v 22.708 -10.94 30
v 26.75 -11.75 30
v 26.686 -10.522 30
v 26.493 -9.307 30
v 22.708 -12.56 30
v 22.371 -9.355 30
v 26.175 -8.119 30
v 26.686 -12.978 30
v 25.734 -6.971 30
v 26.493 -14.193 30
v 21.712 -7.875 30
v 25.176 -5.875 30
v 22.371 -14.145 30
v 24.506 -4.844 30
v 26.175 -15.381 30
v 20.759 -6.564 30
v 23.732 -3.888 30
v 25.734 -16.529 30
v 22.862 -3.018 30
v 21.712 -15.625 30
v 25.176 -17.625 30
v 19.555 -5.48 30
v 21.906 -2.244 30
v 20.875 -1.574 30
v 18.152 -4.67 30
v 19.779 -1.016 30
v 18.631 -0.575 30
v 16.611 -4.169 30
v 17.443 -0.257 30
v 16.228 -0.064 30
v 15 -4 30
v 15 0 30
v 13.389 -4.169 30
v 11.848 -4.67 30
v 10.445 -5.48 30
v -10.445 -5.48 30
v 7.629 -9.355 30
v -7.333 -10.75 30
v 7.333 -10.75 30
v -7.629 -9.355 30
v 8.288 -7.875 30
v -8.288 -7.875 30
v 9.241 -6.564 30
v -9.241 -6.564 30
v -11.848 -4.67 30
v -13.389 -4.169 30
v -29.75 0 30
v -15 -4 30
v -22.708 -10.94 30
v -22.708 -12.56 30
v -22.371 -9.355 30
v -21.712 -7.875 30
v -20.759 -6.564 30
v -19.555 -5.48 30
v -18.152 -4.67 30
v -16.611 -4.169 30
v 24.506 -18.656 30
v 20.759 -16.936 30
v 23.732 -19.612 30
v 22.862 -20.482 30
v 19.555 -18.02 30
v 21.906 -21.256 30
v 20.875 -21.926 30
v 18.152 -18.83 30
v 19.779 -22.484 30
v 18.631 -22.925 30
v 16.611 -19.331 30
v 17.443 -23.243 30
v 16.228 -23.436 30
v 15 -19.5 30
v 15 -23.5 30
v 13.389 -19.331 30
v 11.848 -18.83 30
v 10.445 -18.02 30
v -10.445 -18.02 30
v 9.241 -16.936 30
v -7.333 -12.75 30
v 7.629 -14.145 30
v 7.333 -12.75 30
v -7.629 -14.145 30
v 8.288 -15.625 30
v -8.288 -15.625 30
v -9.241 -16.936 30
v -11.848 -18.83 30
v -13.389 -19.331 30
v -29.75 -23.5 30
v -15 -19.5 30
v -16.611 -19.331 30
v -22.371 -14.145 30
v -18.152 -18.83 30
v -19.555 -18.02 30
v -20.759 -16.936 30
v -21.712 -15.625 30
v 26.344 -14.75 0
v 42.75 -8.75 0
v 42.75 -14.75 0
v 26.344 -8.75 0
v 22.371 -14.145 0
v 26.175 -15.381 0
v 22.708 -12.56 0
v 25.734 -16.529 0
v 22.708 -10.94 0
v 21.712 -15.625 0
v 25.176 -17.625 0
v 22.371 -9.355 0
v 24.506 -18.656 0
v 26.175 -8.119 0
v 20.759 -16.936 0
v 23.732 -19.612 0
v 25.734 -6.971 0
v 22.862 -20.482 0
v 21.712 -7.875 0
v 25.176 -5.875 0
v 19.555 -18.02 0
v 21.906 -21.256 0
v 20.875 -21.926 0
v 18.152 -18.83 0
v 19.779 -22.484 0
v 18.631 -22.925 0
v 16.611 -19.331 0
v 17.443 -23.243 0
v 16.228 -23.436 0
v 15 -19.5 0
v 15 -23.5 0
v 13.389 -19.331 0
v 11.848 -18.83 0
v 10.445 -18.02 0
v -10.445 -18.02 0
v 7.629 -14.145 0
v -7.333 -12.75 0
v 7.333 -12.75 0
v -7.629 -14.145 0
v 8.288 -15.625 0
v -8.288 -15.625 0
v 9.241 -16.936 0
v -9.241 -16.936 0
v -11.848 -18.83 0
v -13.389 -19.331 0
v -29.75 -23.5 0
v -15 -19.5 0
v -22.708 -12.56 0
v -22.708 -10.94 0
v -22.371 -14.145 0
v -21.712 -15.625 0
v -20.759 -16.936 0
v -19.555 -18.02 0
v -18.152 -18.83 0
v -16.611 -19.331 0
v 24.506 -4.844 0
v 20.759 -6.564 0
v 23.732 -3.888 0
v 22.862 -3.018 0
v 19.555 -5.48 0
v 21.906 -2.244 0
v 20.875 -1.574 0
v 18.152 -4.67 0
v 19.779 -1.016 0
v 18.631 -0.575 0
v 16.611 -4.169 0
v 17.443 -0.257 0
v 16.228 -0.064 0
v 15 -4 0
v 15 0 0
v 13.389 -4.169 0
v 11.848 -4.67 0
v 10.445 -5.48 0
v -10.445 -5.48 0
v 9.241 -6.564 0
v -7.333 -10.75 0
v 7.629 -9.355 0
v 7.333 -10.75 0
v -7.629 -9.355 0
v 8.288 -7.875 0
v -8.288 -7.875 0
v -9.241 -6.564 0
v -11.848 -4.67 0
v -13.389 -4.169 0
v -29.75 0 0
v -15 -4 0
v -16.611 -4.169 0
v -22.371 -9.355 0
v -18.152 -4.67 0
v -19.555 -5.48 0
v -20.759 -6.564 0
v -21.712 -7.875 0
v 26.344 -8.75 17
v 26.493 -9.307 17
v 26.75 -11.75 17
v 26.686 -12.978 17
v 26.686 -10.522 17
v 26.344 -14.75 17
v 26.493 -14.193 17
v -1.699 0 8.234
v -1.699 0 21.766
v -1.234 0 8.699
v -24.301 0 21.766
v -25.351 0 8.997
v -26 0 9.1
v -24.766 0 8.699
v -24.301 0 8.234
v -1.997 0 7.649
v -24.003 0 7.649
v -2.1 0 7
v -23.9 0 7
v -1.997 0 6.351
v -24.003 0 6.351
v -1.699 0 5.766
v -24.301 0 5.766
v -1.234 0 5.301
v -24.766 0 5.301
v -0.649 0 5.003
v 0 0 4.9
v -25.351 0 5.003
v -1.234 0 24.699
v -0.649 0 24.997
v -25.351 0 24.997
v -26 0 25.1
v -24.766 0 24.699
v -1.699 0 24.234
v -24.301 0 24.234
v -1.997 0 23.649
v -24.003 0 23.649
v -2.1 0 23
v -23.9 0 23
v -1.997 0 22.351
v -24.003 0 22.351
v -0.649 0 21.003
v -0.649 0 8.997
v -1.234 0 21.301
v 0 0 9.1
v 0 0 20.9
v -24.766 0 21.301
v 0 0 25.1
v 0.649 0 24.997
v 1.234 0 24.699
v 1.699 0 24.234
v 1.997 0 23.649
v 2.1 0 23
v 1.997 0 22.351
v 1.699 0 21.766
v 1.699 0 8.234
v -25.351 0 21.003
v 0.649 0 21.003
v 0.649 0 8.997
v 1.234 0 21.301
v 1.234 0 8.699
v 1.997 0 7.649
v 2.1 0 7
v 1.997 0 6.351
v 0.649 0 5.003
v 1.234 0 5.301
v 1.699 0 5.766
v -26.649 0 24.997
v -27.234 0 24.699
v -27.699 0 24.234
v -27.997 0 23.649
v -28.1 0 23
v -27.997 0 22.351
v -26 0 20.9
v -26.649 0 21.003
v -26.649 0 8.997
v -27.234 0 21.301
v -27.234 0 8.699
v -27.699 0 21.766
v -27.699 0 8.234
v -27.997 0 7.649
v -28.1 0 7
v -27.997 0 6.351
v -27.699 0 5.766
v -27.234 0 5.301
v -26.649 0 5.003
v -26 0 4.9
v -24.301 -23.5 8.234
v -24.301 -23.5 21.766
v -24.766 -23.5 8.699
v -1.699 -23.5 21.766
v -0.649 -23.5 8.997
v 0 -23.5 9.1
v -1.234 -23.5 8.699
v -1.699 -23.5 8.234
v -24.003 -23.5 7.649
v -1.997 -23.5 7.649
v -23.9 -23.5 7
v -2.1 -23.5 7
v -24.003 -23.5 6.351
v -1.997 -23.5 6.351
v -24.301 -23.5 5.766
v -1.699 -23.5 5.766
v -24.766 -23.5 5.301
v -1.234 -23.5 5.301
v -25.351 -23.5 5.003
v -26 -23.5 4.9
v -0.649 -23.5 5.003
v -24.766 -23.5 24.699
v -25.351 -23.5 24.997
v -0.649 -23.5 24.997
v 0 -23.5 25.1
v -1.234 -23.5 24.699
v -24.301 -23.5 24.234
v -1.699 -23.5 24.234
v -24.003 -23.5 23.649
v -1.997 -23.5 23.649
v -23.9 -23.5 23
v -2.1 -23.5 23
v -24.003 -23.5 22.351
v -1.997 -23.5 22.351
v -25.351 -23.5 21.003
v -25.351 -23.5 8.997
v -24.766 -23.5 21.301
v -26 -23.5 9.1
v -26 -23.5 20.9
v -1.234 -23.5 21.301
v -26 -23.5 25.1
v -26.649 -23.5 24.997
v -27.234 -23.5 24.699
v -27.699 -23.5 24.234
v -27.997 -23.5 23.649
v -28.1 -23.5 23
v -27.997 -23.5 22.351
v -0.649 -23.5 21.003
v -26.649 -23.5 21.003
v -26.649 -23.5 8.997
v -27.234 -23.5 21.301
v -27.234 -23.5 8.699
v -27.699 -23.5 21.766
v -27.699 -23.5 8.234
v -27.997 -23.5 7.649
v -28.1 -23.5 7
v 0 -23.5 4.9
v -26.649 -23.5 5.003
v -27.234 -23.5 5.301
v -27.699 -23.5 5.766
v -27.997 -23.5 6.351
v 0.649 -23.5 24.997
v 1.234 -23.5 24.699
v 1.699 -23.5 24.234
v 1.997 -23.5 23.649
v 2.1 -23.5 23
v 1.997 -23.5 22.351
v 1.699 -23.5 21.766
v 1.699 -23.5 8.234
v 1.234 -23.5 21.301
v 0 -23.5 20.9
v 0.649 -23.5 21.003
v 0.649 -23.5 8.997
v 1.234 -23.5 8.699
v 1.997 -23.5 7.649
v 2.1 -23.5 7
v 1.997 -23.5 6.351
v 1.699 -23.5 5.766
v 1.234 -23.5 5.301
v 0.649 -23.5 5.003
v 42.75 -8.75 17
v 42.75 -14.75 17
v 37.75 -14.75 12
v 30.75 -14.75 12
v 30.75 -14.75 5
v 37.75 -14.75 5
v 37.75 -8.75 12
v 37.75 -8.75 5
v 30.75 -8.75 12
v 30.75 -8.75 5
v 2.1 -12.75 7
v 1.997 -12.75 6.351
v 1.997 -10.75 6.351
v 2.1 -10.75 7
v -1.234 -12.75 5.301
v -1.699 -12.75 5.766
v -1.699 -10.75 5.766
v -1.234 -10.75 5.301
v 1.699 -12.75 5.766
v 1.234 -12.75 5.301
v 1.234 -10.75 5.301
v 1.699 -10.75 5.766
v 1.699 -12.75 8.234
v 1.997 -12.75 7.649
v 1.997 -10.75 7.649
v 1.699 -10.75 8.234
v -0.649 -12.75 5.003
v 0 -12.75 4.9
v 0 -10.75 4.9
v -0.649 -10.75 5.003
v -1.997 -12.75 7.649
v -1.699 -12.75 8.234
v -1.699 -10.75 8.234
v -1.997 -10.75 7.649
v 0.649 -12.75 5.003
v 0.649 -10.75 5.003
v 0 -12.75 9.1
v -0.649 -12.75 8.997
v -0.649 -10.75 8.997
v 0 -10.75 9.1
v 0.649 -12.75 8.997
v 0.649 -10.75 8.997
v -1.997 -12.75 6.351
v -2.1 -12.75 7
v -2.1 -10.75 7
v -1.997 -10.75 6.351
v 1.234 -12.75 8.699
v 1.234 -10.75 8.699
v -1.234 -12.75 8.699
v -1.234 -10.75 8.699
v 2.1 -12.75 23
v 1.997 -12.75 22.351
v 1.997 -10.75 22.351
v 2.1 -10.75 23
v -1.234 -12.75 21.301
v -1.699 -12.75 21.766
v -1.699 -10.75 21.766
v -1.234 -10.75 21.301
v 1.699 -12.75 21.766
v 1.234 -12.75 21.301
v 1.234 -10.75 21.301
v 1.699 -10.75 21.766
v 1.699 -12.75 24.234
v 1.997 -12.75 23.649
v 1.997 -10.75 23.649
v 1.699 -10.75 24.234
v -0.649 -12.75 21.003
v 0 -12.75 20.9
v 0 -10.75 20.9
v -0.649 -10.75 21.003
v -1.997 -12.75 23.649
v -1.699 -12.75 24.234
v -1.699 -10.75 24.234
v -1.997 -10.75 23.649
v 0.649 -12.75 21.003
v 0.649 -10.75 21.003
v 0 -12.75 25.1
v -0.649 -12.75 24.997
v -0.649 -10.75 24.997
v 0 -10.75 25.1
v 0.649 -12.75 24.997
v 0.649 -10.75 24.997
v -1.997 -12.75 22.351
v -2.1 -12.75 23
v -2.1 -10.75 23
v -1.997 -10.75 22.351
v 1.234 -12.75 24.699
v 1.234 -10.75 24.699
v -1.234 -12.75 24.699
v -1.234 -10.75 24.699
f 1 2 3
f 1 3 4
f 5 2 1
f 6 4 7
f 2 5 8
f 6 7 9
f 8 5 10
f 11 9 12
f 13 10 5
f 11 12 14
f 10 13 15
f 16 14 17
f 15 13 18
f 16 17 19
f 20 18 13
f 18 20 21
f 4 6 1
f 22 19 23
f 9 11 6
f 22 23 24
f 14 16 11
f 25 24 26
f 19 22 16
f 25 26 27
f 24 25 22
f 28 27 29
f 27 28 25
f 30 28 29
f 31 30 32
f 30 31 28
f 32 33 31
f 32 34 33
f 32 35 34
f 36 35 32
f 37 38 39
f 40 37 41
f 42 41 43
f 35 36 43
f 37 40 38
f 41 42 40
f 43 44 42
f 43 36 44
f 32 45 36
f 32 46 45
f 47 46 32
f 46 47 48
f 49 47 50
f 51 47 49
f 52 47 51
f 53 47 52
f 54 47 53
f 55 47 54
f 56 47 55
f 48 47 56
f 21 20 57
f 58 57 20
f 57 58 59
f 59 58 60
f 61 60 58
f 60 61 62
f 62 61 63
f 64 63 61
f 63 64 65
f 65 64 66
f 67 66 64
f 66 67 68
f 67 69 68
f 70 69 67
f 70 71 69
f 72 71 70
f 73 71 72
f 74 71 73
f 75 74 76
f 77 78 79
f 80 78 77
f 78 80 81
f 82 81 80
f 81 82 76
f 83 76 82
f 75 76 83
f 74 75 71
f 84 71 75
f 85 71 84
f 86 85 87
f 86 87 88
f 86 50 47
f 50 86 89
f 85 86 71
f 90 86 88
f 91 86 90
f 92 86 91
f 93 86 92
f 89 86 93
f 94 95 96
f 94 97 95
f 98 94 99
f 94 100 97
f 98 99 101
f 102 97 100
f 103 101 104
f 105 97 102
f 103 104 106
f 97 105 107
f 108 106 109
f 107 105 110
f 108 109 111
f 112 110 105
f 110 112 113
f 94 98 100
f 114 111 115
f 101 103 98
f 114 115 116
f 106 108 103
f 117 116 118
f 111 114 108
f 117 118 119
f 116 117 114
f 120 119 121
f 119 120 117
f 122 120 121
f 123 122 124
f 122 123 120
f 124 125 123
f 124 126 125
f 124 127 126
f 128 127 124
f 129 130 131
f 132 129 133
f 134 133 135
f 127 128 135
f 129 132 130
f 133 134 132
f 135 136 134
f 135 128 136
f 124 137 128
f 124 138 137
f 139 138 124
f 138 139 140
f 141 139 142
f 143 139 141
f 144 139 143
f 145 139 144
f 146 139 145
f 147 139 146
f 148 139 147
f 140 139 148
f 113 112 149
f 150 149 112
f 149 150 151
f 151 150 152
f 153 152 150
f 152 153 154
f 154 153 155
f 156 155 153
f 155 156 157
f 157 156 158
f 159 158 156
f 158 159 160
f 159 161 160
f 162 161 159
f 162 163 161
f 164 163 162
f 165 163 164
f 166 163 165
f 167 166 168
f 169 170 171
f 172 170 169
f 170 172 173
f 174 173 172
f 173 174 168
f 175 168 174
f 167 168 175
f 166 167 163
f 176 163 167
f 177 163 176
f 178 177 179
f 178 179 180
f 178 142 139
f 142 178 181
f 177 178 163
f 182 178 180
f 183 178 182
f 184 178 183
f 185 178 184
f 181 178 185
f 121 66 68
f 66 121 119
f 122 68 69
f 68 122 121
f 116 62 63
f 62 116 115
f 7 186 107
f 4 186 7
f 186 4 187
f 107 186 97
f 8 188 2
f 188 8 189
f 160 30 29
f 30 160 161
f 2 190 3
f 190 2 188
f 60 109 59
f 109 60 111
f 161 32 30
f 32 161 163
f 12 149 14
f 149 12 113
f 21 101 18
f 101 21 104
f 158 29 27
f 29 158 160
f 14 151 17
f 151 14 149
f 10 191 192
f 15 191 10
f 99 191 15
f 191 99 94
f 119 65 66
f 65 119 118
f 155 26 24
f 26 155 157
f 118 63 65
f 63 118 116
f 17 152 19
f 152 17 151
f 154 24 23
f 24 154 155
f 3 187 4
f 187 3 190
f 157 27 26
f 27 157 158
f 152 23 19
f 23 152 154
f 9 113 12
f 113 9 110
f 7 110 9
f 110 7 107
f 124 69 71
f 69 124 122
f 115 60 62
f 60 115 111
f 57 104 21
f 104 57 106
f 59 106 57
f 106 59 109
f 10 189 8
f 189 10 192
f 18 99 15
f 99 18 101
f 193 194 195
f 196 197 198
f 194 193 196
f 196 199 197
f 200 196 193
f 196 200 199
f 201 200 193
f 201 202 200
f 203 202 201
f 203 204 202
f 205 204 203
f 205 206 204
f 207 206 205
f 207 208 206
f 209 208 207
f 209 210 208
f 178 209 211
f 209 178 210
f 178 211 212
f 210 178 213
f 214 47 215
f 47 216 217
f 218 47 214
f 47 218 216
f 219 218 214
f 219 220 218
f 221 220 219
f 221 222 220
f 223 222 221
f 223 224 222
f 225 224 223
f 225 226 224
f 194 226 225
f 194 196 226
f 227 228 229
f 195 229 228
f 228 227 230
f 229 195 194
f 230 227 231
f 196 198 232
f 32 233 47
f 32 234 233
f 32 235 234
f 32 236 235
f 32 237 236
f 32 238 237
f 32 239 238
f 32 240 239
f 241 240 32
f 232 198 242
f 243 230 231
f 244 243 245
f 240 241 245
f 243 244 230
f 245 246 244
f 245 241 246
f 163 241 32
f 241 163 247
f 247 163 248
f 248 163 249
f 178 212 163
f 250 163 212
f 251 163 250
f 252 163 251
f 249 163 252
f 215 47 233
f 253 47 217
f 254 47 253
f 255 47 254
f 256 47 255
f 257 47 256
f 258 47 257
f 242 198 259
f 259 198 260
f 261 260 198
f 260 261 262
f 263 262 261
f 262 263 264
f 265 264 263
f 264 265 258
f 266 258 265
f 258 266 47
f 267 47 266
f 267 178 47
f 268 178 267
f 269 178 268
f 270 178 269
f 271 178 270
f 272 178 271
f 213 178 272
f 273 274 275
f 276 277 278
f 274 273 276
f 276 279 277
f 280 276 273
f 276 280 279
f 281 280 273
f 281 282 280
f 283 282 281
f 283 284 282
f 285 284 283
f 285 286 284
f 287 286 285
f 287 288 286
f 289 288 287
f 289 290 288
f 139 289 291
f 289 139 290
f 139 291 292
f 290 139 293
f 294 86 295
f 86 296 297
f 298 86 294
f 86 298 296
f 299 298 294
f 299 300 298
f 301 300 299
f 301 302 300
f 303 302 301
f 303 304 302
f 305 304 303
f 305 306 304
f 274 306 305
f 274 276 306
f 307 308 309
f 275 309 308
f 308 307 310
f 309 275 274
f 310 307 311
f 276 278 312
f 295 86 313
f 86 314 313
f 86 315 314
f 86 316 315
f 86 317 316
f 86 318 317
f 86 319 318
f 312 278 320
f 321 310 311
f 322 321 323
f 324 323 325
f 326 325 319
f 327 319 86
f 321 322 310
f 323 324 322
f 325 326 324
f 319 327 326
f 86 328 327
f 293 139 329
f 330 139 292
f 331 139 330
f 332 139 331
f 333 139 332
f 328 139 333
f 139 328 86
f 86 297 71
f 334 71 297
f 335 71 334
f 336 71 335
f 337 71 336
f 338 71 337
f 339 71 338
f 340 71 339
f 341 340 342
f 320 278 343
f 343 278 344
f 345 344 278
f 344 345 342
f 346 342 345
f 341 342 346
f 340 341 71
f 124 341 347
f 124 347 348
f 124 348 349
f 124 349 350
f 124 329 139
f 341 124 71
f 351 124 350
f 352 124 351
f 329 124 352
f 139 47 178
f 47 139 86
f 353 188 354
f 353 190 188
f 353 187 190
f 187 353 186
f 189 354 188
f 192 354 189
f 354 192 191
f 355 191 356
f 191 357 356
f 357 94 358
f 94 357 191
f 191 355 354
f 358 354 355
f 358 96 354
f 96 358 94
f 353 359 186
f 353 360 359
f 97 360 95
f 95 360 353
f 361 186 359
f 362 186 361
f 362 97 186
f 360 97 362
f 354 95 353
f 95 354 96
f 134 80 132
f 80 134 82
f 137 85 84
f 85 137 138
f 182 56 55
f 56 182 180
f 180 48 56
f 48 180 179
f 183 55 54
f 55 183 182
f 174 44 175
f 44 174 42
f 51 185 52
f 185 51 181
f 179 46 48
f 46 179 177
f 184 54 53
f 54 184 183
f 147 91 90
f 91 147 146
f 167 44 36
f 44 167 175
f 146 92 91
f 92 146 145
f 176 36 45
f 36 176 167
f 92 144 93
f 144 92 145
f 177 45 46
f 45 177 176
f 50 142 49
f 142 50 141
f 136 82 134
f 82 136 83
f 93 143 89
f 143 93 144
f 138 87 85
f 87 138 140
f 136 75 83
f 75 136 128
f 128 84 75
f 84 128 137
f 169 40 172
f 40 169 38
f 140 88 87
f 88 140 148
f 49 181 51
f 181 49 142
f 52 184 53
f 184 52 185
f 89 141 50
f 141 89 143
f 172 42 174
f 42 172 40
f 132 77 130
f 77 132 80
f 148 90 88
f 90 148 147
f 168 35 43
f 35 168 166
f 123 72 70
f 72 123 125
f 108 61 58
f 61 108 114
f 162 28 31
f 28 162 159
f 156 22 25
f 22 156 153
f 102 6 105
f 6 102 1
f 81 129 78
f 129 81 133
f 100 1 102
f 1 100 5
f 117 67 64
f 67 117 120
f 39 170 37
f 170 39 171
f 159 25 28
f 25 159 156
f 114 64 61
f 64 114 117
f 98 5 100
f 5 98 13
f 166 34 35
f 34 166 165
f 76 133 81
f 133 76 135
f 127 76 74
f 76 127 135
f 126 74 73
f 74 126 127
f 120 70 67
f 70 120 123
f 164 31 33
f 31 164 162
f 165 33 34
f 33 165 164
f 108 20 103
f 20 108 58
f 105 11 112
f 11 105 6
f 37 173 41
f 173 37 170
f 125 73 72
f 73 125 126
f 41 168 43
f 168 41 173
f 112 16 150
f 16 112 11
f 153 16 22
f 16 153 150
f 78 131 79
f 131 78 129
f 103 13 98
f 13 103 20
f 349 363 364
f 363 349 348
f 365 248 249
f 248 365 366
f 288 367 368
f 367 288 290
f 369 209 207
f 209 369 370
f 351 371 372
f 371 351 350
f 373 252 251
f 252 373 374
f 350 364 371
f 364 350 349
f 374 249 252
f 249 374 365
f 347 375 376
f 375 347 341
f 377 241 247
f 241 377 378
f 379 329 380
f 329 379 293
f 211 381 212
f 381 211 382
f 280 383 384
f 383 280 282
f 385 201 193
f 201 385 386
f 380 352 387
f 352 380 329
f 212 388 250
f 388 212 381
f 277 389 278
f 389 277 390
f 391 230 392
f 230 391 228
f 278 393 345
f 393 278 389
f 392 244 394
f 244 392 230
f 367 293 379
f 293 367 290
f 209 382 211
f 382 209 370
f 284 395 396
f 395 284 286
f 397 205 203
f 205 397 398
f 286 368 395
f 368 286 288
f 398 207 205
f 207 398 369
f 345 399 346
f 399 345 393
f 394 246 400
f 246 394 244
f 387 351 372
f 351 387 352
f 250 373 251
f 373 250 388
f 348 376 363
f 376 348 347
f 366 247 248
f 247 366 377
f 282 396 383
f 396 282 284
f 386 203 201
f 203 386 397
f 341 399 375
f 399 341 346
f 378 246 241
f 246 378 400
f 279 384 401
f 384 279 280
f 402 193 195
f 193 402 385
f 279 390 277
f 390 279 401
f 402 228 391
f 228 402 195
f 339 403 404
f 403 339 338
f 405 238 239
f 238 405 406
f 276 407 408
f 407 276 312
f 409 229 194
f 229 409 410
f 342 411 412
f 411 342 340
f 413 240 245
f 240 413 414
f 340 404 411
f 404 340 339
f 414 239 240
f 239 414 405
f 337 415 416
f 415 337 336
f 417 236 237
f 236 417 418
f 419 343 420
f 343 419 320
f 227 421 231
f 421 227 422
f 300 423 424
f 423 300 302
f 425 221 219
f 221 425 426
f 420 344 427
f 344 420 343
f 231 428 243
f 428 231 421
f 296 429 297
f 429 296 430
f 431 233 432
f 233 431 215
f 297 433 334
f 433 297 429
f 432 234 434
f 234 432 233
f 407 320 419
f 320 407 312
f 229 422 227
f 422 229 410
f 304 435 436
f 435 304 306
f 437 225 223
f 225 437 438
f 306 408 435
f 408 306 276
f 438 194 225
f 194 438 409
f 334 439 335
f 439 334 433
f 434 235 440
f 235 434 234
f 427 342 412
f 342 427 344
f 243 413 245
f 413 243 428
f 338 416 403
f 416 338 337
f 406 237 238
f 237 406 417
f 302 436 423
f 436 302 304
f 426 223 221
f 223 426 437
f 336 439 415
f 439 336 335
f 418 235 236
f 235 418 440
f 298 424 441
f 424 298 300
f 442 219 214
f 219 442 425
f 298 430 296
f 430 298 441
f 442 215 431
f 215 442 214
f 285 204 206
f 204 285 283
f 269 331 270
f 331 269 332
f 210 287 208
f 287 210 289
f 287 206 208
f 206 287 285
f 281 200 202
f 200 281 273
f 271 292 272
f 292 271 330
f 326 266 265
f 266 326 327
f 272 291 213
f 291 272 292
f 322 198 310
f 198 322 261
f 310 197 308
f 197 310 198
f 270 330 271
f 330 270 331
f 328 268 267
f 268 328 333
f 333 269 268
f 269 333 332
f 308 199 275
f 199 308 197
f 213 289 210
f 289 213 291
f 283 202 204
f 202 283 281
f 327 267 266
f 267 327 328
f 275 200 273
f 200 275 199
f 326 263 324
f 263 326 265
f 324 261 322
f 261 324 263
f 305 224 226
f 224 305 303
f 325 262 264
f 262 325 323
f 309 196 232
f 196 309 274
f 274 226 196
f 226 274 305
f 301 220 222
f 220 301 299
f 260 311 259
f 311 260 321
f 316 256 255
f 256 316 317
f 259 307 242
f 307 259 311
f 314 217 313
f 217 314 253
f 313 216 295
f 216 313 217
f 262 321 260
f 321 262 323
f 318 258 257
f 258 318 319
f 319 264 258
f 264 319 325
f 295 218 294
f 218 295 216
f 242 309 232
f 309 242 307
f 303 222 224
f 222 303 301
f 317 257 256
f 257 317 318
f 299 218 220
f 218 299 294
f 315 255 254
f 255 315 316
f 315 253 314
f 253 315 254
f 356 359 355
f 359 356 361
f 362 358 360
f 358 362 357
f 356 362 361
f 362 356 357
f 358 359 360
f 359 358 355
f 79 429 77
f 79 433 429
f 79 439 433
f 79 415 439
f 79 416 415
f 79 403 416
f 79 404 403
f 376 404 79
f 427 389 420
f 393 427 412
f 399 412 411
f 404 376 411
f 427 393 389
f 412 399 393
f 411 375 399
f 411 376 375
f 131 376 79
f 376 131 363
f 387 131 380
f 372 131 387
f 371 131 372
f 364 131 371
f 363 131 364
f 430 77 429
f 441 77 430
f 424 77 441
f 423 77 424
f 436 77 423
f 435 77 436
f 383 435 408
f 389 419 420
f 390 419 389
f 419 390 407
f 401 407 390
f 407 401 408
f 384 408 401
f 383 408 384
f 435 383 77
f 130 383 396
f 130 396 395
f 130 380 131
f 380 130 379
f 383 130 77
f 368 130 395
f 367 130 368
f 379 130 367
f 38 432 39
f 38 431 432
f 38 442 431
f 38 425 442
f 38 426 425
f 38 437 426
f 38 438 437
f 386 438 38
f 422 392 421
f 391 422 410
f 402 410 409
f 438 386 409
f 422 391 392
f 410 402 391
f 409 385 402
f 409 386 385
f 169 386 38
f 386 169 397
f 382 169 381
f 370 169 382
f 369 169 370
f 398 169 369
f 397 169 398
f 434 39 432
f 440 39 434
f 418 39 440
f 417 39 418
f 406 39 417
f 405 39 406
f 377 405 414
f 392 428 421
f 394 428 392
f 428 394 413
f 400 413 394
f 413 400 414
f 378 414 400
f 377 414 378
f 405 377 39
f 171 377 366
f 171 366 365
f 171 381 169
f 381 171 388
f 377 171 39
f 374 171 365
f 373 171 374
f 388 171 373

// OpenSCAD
include <wallace2.scad>;

rotate([0,-90,90]) 
x_carriage2();

x_carriage_width = 30;
extruder_mount_hole_spacing = 50;
extruder_shift = extruder_mount_hole_spacing/2; // + bearing_size/2;

module x_carriage2() {

	difference(){
	
		union(){
	
			// Main mounting plate
			//cube([x_carriage_width,extruder_mount_hole_spacing+10,bearing_size/2]);

			// bearing holder
			translate([0,0,bearing_size/2 + 4]) rotate([0,90,0]){		
				translate([-bearing_size/2-4,-x_carriage_width/2,0]) cube([bearing_size + 8, x_rod_spacing+bearing_size/2+7,x_carriage_width]);
				for(side = [1, -1]) translate([0, side * x_rod_spacing / 2, 0]) cylinder(h=x_carriage_width,r=bearing_size/2 + 4, $fn = 60);
			}

			// mounting plate
			 

      // belt clip
      translate([0,-x_carriage_width/2-bearing_size/2-4-5-8-3,bearing_size/2+1]) cube([17,x_carriage_width,6]);
		}

     // Belt clip hole
     translate([(17-7)/2,-x_carriage_width/2-bearing_size/2-4-5-8-3+(17-7)/2,bearing_size/2+1/2]) cube([7,7,7]);
    
    // slice for clamping bearings
    translate([-x_carriage_width/2-1,-(x_carriage_width)/2,bearing_size/2+3 ]) cube([x_carriage_width*2+2,x_carriage_width,2]);
    
		
		translate([0,0,bearing_size / 2 + 4]) rotate([0,90,0]){
			
		// linear bearings
		translate([0, x_rod_spacing / 2, -x_carriage_width/2]) rotate([0, 0, 0]) {
			for(end = [0, 1]) mirror([0, end, 0]) translate([0, (end * x_carriage_width),-1 ]) cylinder(r = bearing_size / 2, h = x_carriage_width * 2 + 2, $fn = 30);
		}
		

		// screw holes for extruder mount
		//rotate([0,90,0]) translate([-x_carriage_width/2,extruder_shift+extruder_mount_hole_spacing/2,-bearing_size/2-4]) cylinder(r=2.1,h=bearing_size+8+1);
		for(side = [8, -8]) rotate([0,90,0]) translate([-x_carriage_width/2+side,extruder_shift-extruder_mount_hole_spacing/2,-bearing_size/2-4]) #cylinder(r=2.1,h=bearing_size+8+1);
		translate([0,26,0])for(side = [8, -8]) rotate([0,90,0]) translate([-x_carriage_width/2+side,extruder_shift-extruder_mount_hole_spacing/2,-bearing_size/2-4]) #cylinder(r=2.1,h=bearing_size+8+1);
		
	}	
	

	}
}
